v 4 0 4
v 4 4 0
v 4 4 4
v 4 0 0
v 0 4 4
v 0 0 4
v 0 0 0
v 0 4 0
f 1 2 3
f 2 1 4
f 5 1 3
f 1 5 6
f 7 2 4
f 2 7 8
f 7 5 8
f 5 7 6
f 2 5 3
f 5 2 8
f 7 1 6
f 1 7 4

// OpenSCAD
/*

Sage Ridge Robotics OpenSCAD file.
Christopher von Nagy, July 2014.

Example 01 cubes. 



*/

// Cubes 
// Rectangular solids are constructed with the cube command.
// We use translate to position the solid. Note how the *entire line*
// ends with a semi-colon. 

translate([0,0,0]) cube(4,4,4);
translate([2,2,2]) cube(4,4,4, center=true);

// Use your mouse in the visualization pane to rotate the view
// around. See what happens when you change
// center=true to center=false in the second cube.

// What happens if you remove the translate() command? Where do 
// objects draw by default?

   
/*

License code:

Creative Commons Atribution 4.0

Attribution — You must give appropriate credit, provide a link to the license, and indicate if changes were made. You may do so in any reasonable manner, but not in any way that suggests the licensor endorses you or your use.

No additional restrictions — You may not apply legal terms or technological measures that legally restrict others from doing anything the license permits.


*/
